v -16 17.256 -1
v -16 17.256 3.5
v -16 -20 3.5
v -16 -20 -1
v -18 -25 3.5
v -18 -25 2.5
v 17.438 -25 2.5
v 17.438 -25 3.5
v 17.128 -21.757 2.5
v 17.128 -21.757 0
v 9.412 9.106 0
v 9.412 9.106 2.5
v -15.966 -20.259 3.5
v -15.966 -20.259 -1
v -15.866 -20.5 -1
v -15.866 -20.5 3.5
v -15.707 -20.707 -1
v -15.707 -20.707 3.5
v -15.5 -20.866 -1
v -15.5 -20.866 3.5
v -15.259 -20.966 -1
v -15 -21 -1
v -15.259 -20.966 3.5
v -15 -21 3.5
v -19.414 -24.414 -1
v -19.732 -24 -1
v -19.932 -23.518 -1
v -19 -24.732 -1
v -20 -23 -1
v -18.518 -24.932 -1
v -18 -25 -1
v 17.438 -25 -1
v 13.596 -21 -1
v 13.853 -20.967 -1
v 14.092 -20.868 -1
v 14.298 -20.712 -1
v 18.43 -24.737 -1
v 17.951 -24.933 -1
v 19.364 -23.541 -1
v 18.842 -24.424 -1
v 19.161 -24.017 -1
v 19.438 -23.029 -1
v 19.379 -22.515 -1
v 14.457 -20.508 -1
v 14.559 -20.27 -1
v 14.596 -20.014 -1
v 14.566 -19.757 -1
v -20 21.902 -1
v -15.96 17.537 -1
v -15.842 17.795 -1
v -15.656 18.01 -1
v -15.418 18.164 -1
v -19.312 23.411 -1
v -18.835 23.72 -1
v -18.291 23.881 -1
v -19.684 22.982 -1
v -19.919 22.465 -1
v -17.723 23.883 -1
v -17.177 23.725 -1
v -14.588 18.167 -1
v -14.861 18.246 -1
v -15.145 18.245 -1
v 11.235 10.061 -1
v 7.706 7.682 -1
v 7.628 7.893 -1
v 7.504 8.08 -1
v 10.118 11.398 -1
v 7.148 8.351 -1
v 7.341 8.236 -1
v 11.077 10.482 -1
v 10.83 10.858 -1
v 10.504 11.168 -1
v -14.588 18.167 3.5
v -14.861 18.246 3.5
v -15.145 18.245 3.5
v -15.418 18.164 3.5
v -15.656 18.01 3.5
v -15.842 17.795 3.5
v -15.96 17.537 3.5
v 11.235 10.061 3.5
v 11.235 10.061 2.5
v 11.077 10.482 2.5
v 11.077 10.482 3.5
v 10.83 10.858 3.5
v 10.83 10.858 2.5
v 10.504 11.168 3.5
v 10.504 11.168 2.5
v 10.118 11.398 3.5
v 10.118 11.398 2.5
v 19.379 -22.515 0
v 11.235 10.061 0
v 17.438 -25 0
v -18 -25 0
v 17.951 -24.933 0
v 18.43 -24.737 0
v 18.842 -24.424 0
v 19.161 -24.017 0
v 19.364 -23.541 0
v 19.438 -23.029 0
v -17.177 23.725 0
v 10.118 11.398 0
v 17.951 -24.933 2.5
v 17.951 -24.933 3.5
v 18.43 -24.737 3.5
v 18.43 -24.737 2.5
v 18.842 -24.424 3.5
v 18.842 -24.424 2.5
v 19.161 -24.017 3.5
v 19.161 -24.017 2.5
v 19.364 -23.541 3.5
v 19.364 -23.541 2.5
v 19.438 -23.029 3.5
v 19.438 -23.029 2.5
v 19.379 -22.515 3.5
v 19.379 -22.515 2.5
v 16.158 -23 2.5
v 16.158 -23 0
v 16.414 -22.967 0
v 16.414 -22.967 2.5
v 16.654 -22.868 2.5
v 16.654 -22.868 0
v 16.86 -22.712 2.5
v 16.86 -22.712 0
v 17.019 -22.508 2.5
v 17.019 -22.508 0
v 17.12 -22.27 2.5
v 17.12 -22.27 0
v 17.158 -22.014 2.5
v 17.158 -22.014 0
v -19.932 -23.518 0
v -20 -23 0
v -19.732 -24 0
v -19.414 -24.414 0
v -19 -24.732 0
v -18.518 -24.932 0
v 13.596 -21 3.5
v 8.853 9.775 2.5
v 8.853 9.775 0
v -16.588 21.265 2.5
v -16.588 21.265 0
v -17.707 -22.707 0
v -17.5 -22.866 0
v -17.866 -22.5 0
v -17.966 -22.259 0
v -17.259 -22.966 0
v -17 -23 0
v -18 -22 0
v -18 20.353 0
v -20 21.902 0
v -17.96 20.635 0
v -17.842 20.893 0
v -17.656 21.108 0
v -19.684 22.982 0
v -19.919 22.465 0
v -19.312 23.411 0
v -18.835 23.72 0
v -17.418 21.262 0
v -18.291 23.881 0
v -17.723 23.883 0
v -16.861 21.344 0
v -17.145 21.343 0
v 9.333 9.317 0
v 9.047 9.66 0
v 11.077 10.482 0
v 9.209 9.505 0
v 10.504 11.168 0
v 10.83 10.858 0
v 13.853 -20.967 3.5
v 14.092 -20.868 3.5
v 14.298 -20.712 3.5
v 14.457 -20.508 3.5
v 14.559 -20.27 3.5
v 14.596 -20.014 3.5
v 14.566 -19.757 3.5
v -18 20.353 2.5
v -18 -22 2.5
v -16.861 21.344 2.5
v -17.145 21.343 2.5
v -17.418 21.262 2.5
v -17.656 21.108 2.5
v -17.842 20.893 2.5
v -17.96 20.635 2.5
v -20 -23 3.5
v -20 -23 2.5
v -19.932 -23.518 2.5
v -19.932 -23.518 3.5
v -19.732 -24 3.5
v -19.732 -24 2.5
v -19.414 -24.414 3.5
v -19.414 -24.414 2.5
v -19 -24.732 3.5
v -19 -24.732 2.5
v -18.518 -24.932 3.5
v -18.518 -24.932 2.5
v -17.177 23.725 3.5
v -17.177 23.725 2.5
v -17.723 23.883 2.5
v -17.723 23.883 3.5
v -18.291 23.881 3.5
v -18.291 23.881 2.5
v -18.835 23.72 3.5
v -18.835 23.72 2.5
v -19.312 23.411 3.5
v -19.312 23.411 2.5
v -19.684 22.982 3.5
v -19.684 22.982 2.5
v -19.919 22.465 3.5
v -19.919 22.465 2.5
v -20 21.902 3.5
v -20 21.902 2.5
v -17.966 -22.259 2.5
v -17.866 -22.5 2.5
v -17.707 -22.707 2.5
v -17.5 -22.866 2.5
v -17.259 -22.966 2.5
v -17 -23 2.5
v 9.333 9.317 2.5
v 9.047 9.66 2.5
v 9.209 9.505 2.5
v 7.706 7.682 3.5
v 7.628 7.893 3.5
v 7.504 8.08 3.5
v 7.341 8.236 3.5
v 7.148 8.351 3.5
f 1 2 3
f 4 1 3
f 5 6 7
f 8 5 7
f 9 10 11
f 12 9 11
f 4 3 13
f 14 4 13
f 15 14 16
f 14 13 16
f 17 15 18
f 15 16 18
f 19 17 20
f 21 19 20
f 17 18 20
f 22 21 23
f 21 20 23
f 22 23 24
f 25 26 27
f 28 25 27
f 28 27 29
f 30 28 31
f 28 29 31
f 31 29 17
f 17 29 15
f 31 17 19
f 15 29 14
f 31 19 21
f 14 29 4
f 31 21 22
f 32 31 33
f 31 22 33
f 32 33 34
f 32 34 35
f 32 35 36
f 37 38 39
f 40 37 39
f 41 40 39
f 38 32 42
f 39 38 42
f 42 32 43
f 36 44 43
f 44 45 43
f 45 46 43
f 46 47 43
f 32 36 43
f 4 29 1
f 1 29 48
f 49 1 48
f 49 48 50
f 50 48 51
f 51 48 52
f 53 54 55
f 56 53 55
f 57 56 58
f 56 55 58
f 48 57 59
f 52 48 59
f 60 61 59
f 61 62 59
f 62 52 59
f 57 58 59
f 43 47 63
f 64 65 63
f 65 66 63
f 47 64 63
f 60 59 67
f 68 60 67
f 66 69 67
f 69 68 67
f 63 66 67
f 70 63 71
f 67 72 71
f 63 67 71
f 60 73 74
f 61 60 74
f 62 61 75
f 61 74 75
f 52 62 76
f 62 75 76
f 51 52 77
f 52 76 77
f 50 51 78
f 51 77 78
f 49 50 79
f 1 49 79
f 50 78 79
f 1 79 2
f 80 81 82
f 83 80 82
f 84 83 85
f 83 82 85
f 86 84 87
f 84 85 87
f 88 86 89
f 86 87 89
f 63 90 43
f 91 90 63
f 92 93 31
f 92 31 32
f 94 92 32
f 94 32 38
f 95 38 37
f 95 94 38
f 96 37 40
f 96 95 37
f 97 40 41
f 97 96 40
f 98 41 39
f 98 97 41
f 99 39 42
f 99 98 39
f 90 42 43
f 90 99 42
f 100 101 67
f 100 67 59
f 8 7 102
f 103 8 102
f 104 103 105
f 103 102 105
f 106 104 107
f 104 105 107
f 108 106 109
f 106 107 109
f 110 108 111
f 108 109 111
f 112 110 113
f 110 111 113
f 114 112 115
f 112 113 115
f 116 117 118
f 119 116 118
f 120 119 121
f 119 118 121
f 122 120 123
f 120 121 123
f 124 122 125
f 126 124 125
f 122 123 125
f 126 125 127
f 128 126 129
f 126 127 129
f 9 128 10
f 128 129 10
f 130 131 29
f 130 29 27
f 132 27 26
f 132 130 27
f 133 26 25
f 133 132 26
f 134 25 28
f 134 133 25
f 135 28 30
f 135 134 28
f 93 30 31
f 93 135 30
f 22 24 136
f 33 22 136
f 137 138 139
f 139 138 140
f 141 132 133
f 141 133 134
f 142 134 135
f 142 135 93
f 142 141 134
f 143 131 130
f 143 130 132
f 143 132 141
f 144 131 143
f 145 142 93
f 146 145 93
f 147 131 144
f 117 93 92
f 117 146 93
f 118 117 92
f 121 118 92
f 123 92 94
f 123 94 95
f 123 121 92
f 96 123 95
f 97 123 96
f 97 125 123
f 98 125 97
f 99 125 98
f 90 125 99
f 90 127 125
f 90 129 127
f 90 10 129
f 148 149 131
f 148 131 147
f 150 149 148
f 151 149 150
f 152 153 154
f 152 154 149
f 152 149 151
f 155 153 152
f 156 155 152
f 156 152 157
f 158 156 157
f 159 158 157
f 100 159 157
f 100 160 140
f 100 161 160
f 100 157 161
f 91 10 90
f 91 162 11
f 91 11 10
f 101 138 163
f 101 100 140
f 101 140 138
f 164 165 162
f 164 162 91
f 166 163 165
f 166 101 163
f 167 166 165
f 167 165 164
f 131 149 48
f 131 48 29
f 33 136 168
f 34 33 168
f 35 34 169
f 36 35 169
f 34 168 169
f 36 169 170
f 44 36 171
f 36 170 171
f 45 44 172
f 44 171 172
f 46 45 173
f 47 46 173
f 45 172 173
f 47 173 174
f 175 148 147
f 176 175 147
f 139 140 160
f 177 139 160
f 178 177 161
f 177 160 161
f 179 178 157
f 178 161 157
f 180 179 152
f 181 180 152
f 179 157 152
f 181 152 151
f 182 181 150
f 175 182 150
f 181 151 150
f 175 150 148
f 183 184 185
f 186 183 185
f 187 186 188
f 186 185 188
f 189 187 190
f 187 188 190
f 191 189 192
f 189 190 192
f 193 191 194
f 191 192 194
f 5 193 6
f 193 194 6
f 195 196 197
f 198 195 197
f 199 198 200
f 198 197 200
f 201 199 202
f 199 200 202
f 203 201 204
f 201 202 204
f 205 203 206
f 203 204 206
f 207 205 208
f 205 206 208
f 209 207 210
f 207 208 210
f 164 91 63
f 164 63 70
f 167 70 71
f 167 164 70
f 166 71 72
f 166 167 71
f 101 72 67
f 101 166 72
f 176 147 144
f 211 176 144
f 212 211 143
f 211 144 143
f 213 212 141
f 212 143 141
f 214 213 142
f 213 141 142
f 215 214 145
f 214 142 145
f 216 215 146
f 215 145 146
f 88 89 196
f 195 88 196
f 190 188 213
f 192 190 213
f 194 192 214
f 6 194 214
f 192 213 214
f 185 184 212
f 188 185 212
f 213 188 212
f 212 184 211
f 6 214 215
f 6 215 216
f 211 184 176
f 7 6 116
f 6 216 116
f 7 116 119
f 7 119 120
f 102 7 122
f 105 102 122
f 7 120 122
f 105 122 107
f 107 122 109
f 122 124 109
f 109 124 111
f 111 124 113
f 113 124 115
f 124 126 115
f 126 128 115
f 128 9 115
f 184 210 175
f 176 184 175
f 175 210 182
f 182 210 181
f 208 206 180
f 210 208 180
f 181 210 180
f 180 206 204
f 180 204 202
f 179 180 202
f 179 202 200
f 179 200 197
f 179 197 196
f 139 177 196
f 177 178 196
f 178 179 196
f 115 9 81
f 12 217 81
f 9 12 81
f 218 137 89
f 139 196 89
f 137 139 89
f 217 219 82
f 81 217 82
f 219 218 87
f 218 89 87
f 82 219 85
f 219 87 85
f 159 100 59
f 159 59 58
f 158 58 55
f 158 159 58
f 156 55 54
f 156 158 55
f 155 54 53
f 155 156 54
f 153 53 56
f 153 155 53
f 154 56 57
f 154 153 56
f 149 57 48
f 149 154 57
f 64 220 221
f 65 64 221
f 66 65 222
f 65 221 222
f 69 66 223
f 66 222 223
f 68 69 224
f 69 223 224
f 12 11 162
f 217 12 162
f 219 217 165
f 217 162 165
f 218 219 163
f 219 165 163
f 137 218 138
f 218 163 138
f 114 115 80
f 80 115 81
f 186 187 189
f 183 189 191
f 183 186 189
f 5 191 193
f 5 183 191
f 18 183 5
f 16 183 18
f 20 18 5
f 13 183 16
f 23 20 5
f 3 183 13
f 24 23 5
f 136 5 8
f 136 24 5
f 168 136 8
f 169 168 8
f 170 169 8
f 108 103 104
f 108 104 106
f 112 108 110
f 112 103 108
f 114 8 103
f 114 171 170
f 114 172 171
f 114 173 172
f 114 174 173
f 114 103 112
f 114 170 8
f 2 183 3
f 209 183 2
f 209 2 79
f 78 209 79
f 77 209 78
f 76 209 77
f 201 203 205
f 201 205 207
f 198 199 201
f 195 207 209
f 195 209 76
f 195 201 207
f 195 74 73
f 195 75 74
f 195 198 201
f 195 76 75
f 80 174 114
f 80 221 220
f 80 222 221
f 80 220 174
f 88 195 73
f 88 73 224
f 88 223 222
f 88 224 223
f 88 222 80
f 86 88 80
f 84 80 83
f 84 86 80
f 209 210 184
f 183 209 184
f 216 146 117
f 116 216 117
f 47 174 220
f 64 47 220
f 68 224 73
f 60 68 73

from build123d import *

# Parameters (mm, degrees)
F2_DEPTH = 2.5
F3_DEPTH = 1
F5_DEPTH = 1
F7_DEPTH = 4.5


with BuildPart() as f2:
    # F1 (on Top) → F2 (new body)
    with BuildSketch(Plane.XY):
        with BuildLine():
            ThreePointArc((9.411918, 9.106117), (9.209323, 9.504574), (8.853362, 9.774952))
            Line((8.853362, 9.774952), (-16.588413, 21.264786))
            ThreePointArc((-16.588413, 21.264786), (-17.542408, 21.193531), (-18, 20.353416))
            Line((-18, 20.353416), (-18, -22))
            ThreePointArc((-18, -22), (-17.707107, -22.707107), (-17, -23))
            Line((-17, -23), (16.157671, -23))
            ThreePointArc((16.157671, -23), (16.945876, -22.615412), (17.127813, -21.757464))
            Line((17.127813, -21.757464), (9.411918, 9.106117))
        make_face()
    extrude(amount=F2_DEPTH)

    # F0 (on Top) → F3 (join)
    with BuildSketch(Plane.XY):
        with BuildLine():
            Line((-18, -25), (17.438447, -25))
            ThreePointArc((17.438447, -25), (19.014858, -24.230824), (19.378732, -22.514929))
            Line((19.378732, -22.514929), (11.234802, 10.060792))
            ThreePointArc((11.234802, 10.060792), (10.829612, 10.857706), (10.11769, 11.398462))
            Line((10.11769, 11.398462), (-17.176827, 23.725018))
            ThreePointArc((-17.176827, 23.725018), (-19.084816, 23.582507), (-20, 21.902277))
            Line((-20, 21.902277), (-20, -23))
            ThreePointArc((-20, -23), (-19.414214, -24.414214), (-18, -25))
        make_face()
    extrude(amount=-F3_DEPTH)

    # F4 (on face) → F5 (join)
    with BuildSketch(Plane.XY.offset(2.5)):
        with BuildLine():
            Line((19.378732, -22.514929), (11.234802, 10.060792))
            ThreePointArc((11.234802, 10.060792), (10.829612, 10.857706), (10.11769, 11.398462))
            Line((10.11769, 11.398462), (-17.176827, 23.725018))
            ThreePointArc((-17.176827, 23.725018), (-19.084816, 23.582507), (-20, 21.902277))
            Line((-20, 21.902277), (-20, -23))
            ThreePointArc((-20, -23), (-19.414214, -24.414214), (-18, -25))
            Line((-18, -25), (17.438447, -25))
            ThreePointArc((17.438447, -25), (19.014858, -24.230824), (19.378732, -22.514929))
        make_face()
        with BuildLine():
            ThreePointArc((8.853362, 9.774952), (9.209323, 9.504574), (9.411918, 9.106117))
            Line((9.411918, 9.106117), (17.127813, -21.757464))
            ThreePointArc((17.127813, -21.757464), (16.945876, -22.615412), (16.157671, -23))
            Line((16.157671, -23), (-17, -23))
            ThreePointArc((-17, -23), (-17.707107, -22.707107), (-18, -22))
            Line((-18, -22), (-18, 20.353416))
            ThreePointArc((-18, 20.353416), (-17.542408, 21.193531), (-16.588413, 21.264786))
            Line((-16.588413, 21.264786), (8.853362, 9.774952))
        make_face(mode=Mode.SUBTRACT)
        with BuildLine():
            Line((17.127813, -21.757464), (9.411918, 9.106117))
            ThreePointArc((9.411918, 9.106117), (9.209323, 9.504574), (8.853362, 9.774952))
            Line((8.853362, 9.774952), (-16.588413, 21.264786))
            ThreePointArc((-16.588413, 21.264786), (-17.542408, 21.193531), (-18, 20.353416))
            Line((-18, 20.353416), (-18, -22))
            ThreePointArc((-18, -22), (-17.707107, -22.707107), (-17, -23))
            Line((-17, -23), (16.157671, -23))
            ThreePointArc((16.157671, -23), (16.945876, -22.615412), (17.127813, -21.757464))
        make_face()
    extrude(amount=F5_DEPTH)

    # F6 (on face) → F7 (cut)
    with BuildSketch(Plane.XY.offset(3.5)):
        with BuildLine():
            ThreePointArc((13.596118, -21), (14.384323, -20.615412), (14.56626, -19.757464))
            Line((14.56626, -19.757464), (7.706434, 7.681839))
            ThreePointArc((7.706434, 7.681839), (7.503839, 8.080295), (7.147879, 8.350674))
            Line((7.147879, 8.350674), (-14.588414, 18.167064))
            ThreePointArc((-14.588414, 18.167064), (-15.542409, 18.095808), (-16.000001, 17.255693))
            Line((-16.000001, 17.255693), (-16.000001, -20))
            ThreePointArc((-16.000001, -20), (-15.707107, -20.707107), (-15.000001, -21))
            Line((-15.000001, -21), (13.596118, -21))
        make_face()
    extrude(amount=-F7_DEPTH, mode=Mode.SUBTRACT)


solid = f2.part
